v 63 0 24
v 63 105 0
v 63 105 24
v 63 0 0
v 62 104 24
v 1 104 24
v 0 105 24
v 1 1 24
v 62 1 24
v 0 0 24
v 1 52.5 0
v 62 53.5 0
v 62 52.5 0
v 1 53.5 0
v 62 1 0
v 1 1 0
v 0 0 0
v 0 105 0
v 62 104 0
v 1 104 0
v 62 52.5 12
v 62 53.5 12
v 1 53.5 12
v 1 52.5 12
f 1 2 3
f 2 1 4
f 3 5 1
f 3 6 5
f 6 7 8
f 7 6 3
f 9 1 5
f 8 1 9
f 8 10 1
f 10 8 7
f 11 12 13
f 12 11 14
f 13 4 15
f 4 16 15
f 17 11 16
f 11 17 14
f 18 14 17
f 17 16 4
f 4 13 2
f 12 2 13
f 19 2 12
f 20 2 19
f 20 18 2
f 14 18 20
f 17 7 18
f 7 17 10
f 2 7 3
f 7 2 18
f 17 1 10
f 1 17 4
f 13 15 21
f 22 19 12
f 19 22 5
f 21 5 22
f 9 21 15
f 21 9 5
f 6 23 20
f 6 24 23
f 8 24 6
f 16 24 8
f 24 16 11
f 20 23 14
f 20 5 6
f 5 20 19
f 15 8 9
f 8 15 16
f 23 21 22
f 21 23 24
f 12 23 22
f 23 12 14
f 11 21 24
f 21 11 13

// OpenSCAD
// creates a shape to approximate the device to hold
// not solid, just outline of rectangle with 1 inner
// support to keep it square

// device dimensions
// width
w = 63;
// length
l = 105;
// height
h = 24;

// How thick to make the walls
wallThickness = 1;

difference() {
    cube([w, l, h], center=false);
    translate([wallThickness, wallThickness, 0])
    cube([ (w-2*wallThickness), (l-2*wallThickness), h]);
}

// draw center line for strength
color("red")
translate([0, l/2, 0])
cube([w, wallThickness, h/2]);
